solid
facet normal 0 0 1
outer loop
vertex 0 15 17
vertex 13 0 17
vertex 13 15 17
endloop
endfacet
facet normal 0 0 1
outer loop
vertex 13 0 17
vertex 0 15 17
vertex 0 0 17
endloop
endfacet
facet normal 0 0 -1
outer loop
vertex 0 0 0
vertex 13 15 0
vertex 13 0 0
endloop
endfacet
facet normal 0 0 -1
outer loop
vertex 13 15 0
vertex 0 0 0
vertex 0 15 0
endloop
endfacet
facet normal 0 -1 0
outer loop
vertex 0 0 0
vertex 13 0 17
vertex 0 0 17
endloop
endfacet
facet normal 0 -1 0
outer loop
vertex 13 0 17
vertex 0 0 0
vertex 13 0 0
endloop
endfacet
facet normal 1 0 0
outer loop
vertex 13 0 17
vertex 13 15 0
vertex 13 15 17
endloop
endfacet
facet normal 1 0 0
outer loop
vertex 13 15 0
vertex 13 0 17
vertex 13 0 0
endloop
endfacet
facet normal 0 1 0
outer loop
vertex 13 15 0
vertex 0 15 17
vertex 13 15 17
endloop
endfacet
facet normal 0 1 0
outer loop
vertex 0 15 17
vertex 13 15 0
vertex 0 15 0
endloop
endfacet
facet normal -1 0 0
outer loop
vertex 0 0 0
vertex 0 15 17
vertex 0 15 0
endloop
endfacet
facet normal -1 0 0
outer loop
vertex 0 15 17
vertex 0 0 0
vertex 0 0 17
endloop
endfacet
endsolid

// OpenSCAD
// Generated by SolidPython 1.0.1 on 2020-07-29 00:46:55


cube(size = [13, 15, 17]);
/***********************************************
*********      SolidPython code:      **********
************************************************
 
# import packages: SolidPython
from solid import *
from solid.utils import *
from itertools import chain, combinations, permutations


class Resize:

    def __init__(self, scad_file):
        self.scad_file = scad_file
        #self.scad_file = import_scad(scad_file)
        # cone/cylinder param:
        self.r1 = 0
        self.r2 = 0
        self.h = 0
        # rectangular prism param:
        self.w = 0
        self.l = 0
        # ellipse param:
        self.r = 0

    # import OpenScad code (file name corresponds to shape)


    # classify shape + parameters
    def assign(self, param1, param2, param3):
        if self.scad_file == 'cone.scad':
            self.r1 = param1
            self.r2 = param2
            self.h = param3
        elif self.scad_file == 'cylinder.scad':
            self.r1 = param1
            self.r2 = param2
            self.h = param3
        elif self.scad_file == 'rectangularPrism.scad':
            self.h = param1
            self.l = param2
            self.w = param3
        else:
            self.r = param1
            self.h = param2

    # resize parameters
    def iterate(self):
        x = range(3, 20, 2)
        i = 1
        if self.scad_file == 'cone.scad':
            tempList = list(permutations(x, 2))
            for temp in tempList:
                param1 = temp[0]
                param2 = temp[1]
                filepath = 'produced_scad_files/' + 'cone' + str(param1) + '_' + str(param2) + '_' + '.scad'
                scad_render_to_file(cylinder(h=param1, r1=param2, r2=0), filepath)

        elif self.scad_file == 'cylinder.scad':
            tempList = list(permutations(x, 3))
            for temp in tempList:
                param1 = temp[0]
                param2 = temp[1]
                filepath = 'produced_scad_files/' + 'cylinder' + str(param1) + '_' + str(param2) + '_' + '.scad'
                scad_render_to_file(cylinder(h=param1, r1=param2, r2=param2), filepath)

        elif self.scad_file == 'rectangularPrism.scad':
            tempList = list(permutations(x, 3))
            for temp in tempList:
                param1 = temp[0]
                param2 = temp[1]
                param3 = temp[2]
                filepath = 'produced_scad_files/' + 'rectangularPrism' + str(param1) + '_' + str(param2) + '_' + str(
                    param3) + '.scad'
                scad_render_to_file(cube(size=(param1, param2, param3)), filepath)

        elif self.scad_file == 'ellipse.scad':
            tempList = list(permutations(x, 4))
            for temp in tempList:
                param1 = temp[0]
                param2 = temp[1]
                param3 = temp[2]
                param4 = temp[3]
                filepath = 'produced_scad_files/' + 'ellipse' + str(param1) + '_' + str(param2) + '_' + str(param3) + '_' + str(param4) + '.scad'
                scad_render_to_file(scale([param1, param2, param3])(sphere(r=param4)), filepath)

    def render_to_scadfile(self):
        scad_render_to_file(scad, 'example.scad') 
 
************************************************/
